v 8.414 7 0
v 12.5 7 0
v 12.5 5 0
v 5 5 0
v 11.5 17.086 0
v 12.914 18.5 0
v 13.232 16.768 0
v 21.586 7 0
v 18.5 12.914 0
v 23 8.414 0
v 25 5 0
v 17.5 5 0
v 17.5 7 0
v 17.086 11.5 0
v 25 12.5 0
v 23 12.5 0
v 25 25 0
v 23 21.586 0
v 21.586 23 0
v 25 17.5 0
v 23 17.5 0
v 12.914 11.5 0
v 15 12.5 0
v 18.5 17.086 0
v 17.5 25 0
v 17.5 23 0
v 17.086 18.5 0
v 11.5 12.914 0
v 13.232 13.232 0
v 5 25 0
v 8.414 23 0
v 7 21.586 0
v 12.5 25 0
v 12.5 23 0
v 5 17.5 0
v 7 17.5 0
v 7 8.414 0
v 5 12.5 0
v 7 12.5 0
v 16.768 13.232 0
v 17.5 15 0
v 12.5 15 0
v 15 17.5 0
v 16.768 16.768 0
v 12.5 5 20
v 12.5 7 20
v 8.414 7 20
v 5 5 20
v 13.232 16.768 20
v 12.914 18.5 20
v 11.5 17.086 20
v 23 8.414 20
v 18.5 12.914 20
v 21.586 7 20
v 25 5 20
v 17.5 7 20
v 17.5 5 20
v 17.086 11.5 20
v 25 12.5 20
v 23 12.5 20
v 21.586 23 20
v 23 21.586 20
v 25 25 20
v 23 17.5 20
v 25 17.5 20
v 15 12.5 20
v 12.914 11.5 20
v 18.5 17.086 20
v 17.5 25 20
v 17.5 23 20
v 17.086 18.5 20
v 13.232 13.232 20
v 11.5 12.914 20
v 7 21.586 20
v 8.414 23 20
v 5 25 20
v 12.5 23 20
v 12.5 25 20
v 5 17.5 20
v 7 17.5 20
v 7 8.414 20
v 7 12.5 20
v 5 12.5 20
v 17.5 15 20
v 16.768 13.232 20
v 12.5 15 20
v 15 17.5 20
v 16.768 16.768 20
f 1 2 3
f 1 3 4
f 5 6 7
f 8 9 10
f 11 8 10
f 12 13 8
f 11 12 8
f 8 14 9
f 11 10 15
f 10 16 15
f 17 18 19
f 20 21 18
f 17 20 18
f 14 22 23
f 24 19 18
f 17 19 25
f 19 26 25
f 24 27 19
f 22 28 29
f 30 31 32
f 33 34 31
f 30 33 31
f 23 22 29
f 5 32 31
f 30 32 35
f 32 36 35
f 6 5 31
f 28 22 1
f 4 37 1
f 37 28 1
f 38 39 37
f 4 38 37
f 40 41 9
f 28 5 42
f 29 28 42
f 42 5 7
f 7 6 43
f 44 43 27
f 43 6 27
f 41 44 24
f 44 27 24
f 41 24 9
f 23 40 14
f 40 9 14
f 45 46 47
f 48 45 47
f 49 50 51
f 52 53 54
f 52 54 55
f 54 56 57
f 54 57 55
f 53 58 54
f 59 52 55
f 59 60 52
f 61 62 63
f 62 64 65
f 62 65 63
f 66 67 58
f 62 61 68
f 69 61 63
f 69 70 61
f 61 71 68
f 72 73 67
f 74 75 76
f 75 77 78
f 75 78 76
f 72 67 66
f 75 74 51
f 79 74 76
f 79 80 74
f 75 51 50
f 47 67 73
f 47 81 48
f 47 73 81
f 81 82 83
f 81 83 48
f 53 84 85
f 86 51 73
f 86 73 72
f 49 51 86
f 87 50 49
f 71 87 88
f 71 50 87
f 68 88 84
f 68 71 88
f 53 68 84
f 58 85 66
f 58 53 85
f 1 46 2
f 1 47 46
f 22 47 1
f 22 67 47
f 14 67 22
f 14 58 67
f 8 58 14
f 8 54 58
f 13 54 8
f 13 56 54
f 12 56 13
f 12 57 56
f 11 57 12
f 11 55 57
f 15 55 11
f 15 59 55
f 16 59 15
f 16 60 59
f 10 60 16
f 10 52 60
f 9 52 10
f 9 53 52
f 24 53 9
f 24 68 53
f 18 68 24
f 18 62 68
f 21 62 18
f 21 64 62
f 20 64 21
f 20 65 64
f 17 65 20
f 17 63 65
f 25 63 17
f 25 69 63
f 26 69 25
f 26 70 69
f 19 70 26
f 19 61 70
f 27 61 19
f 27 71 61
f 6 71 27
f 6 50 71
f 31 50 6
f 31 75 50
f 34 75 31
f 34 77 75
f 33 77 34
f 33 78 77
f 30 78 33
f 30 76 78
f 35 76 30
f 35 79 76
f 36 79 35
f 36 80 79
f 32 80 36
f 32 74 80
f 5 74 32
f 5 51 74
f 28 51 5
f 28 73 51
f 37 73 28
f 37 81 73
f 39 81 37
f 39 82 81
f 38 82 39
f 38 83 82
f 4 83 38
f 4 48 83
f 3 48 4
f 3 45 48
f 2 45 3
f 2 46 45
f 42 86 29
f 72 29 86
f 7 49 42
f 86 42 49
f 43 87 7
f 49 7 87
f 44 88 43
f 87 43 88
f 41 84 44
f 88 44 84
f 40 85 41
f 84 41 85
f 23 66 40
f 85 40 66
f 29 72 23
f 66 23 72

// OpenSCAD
// file: libs/nathan7-tslot-library.scad
//(C) Nathan Zadoks 2011
//CC-BY-SA or GPLv2, pick your poison.
module nathan_tslot(
        size=10,        //size of each side
        length=10,      //length. descriptive enough, no?
        thickness=3,    //thickness of the 'sheet'
        gap=0,          //gap, thickness of the lower part of the 'T'
        center=false,   //somewhat vague. todo.
        nut=false,      //set to true to make a fitting T-slot nut
){
        start=thickness/sqrt(2);
        if(nut){
                linear_extrude(height=10)
                intersection(){
                        polygon([[size/2-gap/2,0],[size/2-gap/2,thickness],[thickness+start,thickness],[size/2,size/2-2],[size-thickness-start,thickness],[size/2+gap/2,thickness],[size/2+gap/2,0]]);
                        square([size,size/2-(gap+thickness)/2]);
                }
        }       
        else{
                color([0.5,0.5,0.5])
                linear_extrude(height=length,center=center)
                translate([15,15])
                difference(){
                        union(){
                                for(d=[0:3]) rotate([0,0,d*90]) polygon(points=[
                                        [0,0],
                                        [0,start],[size/2-thickness-start,size/2-thickness],[gap/2,size/2-thickness],[gap/2,size/2],
                                        [size/2,size/2],[size/2,gap/2],[size/2-thickness,gap/2],[size/2-thickness,size/2-thickness-start],[start,0]
                                ]);
                                square(gap+thickness,center=true);
                        }
                        circle(r=gap/2,center=true);
                }
        }
}
module tslot20(length,nut){
        tslot(size=20,gap=5.26,thickness=1.5,length=length,nut=nut);
}
module tslot30(length,nut){
        tslot(size=30,gap=8.13,thickness=2.55,length=length,nut=nut);
}
module tslot30_3060(length,nut){
        union(){
                tslot30(length,nut);
                translate([30,0,0])
                tslot30(length,nut);
        }
}
// main file
// 20/40 T-slot profiles for structure

include <libs/nathan7-tslot-library.scad>

nathan_tslot(size = 20, length = 20, gap=5, thickness=2 );
